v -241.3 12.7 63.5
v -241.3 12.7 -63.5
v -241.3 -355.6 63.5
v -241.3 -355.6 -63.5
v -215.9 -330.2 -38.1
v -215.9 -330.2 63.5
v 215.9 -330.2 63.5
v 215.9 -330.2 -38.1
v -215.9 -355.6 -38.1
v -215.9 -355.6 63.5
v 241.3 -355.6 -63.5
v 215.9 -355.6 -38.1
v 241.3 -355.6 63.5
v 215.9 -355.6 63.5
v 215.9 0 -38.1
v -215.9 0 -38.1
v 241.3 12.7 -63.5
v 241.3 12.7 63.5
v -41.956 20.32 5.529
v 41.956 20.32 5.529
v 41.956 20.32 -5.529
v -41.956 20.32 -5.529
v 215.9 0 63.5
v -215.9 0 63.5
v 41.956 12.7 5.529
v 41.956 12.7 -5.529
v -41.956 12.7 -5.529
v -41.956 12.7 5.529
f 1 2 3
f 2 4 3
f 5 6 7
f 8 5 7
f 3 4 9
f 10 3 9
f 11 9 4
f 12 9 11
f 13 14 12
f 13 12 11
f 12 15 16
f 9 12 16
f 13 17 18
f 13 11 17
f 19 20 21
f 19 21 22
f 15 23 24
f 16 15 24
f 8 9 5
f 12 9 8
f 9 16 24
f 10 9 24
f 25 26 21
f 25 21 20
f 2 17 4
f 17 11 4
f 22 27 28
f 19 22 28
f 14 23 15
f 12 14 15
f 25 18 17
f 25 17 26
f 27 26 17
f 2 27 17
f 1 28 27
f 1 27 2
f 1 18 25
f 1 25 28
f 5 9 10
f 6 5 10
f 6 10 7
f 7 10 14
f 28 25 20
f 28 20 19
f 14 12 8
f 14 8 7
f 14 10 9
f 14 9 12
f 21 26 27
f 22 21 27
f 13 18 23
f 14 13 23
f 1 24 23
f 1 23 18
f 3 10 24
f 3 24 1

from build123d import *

# Parameters (mm, degrees)
F1_DEPTH = 355.6
F2_W     = 431.8
F2_H     = 101.6
F3_DEPTH = 25.4
F4_W     = 482.6
F4_H     = 127
F5_DEPTH = 12.7
F6_W     = 83.9129313827
F6_H     = 11.058293283
F7_DEPTH = 7.62


with BuildPart() as f1:
    # F0 (on Front) → F1 (new body)
    with BuildSketch(Plane.XZ):
        Polygon((-241.3, -63.5), (241.3, -63.5), (241.3, 63.5), (215.9, 63.5), (215.9, -38.1), (-215.9, -38.1), (-215.9, 63.5), (-241.3, 63.5), align=None)
    extrude(amount=F1_DEPTH)

    # F4 (on face) → F5 (join)
    with BuildSketch(Plane(origin=(0, 0, 0), x_dir=(-1, 0, 0), z_dir=(0, 1, 0))):
        Rectangle(F4_W, F4_H)
    extrude(amount=F5_DEPTH)

    # F6 (on face) → F7 (join)
    with BuildSketch(Plane(origin=(0, 12.7, 0), x_dir=(-1, 0, 0), z_dir=(0, 1, 0))):
        Rectangle(F6_W, F6_H)
    extrude(amount=F7_DEPTH)


with BuildPart() as f3:
    # F2 (on face) → F3 (new body)
    with BuildSketch(Plane.XZ.offset(355.6)):
        with Locations((0, 12.7)):
            Rectangle(F2_W, F2_H)
    extrude(amount=-F3_DEPTH)


solid = Compound([f1.part, f3.part])
